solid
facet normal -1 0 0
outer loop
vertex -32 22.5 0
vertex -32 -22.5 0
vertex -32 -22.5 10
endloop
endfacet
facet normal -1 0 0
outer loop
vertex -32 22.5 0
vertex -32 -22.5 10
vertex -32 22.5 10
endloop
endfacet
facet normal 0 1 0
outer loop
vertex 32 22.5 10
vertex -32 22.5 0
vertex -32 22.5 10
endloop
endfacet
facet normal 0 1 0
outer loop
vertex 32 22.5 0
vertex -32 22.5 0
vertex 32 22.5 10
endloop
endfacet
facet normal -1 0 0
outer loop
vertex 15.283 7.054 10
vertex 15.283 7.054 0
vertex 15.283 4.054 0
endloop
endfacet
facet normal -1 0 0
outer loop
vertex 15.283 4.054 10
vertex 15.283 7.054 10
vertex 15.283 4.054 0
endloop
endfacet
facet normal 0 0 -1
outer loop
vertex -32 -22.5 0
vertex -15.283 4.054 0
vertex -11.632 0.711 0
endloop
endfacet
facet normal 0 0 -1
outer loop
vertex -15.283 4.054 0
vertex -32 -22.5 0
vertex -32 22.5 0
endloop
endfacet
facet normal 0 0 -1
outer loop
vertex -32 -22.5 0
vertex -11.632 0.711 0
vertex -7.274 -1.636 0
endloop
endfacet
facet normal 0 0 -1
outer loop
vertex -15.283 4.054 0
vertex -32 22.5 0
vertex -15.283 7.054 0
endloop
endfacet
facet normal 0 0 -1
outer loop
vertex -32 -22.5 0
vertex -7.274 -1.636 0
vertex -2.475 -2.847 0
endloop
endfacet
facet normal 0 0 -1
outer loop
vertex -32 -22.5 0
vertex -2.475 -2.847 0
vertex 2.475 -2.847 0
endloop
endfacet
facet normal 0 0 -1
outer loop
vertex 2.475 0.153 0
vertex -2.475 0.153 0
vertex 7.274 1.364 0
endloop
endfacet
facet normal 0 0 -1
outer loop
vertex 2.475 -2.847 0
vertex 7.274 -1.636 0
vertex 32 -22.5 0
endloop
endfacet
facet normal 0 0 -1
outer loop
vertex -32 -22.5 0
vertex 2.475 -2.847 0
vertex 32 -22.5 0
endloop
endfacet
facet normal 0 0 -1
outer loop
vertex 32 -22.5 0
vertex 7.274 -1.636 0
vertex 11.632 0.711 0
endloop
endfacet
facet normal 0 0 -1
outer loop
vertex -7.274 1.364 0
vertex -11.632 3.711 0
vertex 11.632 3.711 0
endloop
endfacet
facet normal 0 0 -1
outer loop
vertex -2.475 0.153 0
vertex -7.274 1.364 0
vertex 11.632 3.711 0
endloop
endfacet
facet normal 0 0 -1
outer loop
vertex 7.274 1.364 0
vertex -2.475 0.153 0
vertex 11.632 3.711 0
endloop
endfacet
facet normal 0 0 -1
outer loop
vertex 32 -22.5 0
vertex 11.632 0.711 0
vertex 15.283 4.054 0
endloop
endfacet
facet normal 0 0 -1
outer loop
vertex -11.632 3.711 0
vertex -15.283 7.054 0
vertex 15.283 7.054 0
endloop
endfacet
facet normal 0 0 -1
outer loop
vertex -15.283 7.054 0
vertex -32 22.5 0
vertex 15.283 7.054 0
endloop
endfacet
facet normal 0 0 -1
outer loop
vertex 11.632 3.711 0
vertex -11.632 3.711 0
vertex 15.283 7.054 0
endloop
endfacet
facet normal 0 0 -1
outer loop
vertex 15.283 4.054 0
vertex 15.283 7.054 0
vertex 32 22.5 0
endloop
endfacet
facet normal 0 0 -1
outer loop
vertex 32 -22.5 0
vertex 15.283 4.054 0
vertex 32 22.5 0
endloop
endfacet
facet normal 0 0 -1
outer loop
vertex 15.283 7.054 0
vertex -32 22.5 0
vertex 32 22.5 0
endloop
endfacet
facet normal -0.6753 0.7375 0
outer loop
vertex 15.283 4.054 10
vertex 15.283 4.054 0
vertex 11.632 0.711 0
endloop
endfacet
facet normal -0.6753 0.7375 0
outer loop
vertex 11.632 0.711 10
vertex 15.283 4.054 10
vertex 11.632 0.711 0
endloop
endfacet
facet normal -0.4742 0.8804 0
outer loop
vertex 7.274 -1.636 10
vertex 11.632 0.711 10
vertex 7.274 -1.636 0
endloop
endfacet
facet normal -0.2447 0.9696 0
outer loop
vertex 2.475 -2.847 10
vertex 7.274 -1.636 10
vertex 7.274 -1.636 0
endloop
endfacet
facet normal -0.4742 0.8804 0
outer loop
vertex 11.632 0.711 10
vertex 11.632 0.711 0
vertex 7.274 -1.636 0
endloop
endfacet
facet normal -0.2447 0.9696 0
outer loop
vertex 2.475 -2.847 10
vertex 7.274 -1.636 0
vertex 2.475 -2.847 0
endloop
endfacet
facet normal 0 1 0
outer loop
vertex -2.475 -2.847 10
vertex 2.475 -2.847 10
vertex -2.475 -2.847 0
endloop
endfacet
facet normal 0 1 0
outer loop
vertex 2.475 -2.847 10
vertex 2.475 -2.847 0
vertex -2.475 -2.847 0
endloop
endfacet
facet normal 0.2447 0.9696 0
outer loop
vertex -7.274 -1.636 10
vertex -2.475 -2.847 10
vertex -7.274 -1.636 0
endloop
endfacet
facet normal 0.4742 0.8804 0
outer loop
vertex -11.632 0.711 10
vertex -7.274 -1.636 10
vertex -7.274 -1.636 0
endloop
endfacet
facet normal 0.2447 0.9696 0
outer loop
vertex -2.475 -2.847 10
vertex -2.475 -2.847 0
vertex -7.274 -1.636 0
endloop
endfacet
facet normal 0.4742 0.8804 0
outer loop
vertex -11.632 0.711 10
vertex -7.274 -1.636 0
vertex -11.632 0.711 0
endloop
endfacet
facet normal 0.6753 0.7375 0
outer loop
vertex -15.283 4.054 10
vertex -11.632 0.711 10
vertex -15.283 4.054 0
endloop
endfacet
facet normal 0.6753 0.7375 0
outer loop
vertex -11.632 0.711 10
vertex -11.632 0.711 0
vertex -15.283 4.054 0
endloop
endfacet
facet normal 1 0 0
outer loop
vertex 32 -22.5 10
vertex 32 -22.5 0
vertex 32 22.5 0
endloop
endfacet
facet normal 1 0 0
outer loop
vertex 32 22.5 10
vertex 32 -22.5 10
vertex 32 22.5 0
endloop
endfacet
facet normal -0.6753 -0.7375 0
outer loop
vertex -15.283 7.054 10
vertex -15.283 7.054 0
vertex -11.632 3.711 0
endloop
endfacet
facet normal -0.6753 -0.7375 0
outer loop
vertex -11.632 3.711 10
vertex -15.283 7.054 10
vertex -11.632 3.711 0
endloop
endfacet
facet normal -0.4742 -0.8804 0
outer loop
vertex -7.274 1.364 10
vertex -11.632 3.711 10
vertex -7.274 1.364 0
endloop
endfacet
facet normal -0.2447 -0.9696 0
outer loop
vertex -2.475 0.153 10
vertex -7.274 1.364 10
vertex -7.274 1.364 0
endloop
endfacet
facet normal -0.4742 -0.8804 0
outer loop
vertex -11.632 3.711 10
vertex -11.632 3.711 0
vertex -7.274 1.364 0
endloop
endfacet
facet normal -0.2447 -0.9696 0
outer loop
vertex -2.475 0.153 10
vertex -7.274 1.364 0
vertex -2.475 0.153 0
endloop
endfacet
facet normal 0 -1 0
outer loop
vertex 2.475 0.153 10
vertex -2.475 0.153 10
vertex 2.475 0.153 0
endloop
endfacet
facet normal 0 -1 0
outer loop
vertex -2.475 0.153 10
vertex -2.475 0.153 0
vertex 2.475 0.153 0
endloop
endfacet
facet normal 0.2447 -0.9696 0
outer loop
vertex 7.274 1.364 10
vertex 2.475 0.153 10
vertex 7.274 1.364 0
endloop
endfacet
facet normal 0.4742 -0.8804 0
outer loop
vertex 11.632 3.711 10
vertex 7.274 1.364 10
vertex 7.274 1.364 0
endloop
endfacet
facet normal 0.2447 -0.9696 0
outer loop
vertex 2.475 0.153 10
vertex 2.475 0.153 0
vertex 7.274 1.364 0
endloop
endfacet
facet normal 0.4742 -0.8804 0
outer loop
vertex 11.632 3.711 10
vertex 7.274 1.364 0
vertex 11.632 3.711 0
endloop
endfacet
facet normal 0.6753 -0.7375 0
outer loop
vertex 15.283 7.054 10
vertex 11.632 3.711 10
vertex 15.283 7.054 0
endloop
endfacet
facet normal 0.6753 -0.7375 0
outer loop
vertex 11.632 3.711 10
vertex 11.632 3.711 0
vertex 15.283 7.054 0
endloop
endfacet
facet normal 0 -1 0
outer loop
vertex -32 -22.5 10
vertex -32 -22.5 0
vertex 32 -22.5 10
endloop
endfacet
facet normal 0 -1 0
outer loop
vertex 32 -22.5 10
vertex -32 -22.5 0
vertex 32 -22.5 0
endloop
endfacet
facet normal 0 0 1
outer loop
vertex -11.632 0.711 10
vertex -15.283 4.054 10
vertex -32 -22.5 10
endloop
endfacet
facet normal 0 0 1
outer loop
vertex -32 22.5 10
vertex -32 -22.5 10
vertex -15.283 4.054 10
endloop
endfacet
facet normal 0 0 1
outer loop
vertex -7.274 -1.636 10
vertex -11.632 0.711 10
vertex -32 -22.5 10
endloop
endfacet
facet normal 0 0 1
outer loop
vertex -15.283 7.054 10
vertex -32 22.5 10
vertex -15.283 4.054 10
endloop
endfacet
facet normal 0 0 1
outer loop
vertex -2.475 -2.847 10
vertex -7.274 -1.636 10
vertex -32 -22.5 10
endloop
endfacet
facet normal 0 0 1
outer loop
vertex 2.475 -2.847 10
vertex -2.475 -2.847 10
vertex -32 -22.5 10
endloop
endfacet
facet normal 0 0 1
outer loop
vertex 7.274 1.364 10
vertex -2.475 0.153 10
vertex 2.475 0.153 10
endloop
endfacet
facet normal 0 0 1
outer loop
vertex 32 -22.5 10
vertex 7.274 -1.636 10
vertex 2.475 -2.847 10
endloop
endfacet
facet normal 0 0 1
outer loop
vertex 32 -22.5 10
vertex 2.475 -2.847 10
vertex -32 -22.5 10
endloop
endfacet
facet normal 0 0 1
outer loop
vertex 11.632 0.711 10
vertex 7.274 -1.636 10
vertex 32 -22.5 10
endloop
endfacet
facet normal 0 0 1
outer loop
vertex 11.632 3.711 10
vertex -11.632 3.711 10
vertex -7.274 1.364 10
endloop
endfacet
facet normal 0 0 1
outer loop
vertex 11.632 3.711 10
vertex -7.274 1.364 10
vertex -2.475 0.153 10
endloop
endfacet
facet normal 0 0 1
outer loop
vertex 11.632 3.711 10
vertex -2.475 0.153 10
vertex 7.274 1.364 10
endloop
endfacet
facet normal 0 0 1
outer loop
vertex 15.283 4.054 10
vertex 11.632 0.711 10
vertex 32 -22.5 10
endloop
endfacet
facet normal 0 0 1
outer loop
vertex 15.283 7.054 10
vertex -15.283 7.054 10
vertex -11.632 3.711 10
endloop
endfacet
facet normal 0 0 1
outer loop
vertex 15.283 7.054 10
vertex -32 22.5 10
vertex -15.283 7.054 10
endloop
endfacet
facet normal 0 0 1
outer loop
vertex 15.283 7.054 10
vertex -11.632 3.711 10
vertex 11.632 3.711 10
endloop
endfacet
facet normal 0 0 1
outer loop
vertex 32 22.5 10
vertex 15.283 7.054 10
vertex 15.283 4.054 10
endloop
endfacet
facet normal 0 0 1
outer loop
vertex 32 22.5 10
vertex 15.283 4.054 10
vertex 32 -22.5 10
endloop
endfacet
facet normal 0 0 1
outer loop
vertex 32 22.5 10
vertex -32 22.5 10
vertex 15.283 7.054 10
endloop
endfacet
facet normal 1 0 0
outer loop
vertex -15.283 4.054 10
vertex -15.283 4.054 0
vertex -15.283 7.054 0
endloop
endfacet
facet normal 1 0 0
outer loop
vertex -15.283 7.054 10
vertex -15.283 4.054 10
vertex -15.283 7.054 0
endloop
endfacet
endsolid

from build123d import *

# Parameters (mm, degrees)
F0_W     = 64
F0_H     = 45
F1_DEPTH = 10


with BuildPart() as f1:
    # F0 (on Top) → F1 (new body)
    with BuildSketch(Plane.XY):
        Rectangle(F0_W, F0_H)
        with BuildLine():
            ThreePointArc((15.282927, 4.053659), (0, -3), (-15.282927, 4.053659))
            Line((-15.282927, 4.053659), (-15.282927, 7.053659))
            ThreePointArc((-15.282927, 7.053659), (0, 0), (15.282927, 7.053659))
            Line((15.282927, 7.053659), (15.282927, 4.053659))
        make_face(mode=Mode.SUBTRACT)
    extrude(amount=F1_DEPTH)


solid = f1.part
